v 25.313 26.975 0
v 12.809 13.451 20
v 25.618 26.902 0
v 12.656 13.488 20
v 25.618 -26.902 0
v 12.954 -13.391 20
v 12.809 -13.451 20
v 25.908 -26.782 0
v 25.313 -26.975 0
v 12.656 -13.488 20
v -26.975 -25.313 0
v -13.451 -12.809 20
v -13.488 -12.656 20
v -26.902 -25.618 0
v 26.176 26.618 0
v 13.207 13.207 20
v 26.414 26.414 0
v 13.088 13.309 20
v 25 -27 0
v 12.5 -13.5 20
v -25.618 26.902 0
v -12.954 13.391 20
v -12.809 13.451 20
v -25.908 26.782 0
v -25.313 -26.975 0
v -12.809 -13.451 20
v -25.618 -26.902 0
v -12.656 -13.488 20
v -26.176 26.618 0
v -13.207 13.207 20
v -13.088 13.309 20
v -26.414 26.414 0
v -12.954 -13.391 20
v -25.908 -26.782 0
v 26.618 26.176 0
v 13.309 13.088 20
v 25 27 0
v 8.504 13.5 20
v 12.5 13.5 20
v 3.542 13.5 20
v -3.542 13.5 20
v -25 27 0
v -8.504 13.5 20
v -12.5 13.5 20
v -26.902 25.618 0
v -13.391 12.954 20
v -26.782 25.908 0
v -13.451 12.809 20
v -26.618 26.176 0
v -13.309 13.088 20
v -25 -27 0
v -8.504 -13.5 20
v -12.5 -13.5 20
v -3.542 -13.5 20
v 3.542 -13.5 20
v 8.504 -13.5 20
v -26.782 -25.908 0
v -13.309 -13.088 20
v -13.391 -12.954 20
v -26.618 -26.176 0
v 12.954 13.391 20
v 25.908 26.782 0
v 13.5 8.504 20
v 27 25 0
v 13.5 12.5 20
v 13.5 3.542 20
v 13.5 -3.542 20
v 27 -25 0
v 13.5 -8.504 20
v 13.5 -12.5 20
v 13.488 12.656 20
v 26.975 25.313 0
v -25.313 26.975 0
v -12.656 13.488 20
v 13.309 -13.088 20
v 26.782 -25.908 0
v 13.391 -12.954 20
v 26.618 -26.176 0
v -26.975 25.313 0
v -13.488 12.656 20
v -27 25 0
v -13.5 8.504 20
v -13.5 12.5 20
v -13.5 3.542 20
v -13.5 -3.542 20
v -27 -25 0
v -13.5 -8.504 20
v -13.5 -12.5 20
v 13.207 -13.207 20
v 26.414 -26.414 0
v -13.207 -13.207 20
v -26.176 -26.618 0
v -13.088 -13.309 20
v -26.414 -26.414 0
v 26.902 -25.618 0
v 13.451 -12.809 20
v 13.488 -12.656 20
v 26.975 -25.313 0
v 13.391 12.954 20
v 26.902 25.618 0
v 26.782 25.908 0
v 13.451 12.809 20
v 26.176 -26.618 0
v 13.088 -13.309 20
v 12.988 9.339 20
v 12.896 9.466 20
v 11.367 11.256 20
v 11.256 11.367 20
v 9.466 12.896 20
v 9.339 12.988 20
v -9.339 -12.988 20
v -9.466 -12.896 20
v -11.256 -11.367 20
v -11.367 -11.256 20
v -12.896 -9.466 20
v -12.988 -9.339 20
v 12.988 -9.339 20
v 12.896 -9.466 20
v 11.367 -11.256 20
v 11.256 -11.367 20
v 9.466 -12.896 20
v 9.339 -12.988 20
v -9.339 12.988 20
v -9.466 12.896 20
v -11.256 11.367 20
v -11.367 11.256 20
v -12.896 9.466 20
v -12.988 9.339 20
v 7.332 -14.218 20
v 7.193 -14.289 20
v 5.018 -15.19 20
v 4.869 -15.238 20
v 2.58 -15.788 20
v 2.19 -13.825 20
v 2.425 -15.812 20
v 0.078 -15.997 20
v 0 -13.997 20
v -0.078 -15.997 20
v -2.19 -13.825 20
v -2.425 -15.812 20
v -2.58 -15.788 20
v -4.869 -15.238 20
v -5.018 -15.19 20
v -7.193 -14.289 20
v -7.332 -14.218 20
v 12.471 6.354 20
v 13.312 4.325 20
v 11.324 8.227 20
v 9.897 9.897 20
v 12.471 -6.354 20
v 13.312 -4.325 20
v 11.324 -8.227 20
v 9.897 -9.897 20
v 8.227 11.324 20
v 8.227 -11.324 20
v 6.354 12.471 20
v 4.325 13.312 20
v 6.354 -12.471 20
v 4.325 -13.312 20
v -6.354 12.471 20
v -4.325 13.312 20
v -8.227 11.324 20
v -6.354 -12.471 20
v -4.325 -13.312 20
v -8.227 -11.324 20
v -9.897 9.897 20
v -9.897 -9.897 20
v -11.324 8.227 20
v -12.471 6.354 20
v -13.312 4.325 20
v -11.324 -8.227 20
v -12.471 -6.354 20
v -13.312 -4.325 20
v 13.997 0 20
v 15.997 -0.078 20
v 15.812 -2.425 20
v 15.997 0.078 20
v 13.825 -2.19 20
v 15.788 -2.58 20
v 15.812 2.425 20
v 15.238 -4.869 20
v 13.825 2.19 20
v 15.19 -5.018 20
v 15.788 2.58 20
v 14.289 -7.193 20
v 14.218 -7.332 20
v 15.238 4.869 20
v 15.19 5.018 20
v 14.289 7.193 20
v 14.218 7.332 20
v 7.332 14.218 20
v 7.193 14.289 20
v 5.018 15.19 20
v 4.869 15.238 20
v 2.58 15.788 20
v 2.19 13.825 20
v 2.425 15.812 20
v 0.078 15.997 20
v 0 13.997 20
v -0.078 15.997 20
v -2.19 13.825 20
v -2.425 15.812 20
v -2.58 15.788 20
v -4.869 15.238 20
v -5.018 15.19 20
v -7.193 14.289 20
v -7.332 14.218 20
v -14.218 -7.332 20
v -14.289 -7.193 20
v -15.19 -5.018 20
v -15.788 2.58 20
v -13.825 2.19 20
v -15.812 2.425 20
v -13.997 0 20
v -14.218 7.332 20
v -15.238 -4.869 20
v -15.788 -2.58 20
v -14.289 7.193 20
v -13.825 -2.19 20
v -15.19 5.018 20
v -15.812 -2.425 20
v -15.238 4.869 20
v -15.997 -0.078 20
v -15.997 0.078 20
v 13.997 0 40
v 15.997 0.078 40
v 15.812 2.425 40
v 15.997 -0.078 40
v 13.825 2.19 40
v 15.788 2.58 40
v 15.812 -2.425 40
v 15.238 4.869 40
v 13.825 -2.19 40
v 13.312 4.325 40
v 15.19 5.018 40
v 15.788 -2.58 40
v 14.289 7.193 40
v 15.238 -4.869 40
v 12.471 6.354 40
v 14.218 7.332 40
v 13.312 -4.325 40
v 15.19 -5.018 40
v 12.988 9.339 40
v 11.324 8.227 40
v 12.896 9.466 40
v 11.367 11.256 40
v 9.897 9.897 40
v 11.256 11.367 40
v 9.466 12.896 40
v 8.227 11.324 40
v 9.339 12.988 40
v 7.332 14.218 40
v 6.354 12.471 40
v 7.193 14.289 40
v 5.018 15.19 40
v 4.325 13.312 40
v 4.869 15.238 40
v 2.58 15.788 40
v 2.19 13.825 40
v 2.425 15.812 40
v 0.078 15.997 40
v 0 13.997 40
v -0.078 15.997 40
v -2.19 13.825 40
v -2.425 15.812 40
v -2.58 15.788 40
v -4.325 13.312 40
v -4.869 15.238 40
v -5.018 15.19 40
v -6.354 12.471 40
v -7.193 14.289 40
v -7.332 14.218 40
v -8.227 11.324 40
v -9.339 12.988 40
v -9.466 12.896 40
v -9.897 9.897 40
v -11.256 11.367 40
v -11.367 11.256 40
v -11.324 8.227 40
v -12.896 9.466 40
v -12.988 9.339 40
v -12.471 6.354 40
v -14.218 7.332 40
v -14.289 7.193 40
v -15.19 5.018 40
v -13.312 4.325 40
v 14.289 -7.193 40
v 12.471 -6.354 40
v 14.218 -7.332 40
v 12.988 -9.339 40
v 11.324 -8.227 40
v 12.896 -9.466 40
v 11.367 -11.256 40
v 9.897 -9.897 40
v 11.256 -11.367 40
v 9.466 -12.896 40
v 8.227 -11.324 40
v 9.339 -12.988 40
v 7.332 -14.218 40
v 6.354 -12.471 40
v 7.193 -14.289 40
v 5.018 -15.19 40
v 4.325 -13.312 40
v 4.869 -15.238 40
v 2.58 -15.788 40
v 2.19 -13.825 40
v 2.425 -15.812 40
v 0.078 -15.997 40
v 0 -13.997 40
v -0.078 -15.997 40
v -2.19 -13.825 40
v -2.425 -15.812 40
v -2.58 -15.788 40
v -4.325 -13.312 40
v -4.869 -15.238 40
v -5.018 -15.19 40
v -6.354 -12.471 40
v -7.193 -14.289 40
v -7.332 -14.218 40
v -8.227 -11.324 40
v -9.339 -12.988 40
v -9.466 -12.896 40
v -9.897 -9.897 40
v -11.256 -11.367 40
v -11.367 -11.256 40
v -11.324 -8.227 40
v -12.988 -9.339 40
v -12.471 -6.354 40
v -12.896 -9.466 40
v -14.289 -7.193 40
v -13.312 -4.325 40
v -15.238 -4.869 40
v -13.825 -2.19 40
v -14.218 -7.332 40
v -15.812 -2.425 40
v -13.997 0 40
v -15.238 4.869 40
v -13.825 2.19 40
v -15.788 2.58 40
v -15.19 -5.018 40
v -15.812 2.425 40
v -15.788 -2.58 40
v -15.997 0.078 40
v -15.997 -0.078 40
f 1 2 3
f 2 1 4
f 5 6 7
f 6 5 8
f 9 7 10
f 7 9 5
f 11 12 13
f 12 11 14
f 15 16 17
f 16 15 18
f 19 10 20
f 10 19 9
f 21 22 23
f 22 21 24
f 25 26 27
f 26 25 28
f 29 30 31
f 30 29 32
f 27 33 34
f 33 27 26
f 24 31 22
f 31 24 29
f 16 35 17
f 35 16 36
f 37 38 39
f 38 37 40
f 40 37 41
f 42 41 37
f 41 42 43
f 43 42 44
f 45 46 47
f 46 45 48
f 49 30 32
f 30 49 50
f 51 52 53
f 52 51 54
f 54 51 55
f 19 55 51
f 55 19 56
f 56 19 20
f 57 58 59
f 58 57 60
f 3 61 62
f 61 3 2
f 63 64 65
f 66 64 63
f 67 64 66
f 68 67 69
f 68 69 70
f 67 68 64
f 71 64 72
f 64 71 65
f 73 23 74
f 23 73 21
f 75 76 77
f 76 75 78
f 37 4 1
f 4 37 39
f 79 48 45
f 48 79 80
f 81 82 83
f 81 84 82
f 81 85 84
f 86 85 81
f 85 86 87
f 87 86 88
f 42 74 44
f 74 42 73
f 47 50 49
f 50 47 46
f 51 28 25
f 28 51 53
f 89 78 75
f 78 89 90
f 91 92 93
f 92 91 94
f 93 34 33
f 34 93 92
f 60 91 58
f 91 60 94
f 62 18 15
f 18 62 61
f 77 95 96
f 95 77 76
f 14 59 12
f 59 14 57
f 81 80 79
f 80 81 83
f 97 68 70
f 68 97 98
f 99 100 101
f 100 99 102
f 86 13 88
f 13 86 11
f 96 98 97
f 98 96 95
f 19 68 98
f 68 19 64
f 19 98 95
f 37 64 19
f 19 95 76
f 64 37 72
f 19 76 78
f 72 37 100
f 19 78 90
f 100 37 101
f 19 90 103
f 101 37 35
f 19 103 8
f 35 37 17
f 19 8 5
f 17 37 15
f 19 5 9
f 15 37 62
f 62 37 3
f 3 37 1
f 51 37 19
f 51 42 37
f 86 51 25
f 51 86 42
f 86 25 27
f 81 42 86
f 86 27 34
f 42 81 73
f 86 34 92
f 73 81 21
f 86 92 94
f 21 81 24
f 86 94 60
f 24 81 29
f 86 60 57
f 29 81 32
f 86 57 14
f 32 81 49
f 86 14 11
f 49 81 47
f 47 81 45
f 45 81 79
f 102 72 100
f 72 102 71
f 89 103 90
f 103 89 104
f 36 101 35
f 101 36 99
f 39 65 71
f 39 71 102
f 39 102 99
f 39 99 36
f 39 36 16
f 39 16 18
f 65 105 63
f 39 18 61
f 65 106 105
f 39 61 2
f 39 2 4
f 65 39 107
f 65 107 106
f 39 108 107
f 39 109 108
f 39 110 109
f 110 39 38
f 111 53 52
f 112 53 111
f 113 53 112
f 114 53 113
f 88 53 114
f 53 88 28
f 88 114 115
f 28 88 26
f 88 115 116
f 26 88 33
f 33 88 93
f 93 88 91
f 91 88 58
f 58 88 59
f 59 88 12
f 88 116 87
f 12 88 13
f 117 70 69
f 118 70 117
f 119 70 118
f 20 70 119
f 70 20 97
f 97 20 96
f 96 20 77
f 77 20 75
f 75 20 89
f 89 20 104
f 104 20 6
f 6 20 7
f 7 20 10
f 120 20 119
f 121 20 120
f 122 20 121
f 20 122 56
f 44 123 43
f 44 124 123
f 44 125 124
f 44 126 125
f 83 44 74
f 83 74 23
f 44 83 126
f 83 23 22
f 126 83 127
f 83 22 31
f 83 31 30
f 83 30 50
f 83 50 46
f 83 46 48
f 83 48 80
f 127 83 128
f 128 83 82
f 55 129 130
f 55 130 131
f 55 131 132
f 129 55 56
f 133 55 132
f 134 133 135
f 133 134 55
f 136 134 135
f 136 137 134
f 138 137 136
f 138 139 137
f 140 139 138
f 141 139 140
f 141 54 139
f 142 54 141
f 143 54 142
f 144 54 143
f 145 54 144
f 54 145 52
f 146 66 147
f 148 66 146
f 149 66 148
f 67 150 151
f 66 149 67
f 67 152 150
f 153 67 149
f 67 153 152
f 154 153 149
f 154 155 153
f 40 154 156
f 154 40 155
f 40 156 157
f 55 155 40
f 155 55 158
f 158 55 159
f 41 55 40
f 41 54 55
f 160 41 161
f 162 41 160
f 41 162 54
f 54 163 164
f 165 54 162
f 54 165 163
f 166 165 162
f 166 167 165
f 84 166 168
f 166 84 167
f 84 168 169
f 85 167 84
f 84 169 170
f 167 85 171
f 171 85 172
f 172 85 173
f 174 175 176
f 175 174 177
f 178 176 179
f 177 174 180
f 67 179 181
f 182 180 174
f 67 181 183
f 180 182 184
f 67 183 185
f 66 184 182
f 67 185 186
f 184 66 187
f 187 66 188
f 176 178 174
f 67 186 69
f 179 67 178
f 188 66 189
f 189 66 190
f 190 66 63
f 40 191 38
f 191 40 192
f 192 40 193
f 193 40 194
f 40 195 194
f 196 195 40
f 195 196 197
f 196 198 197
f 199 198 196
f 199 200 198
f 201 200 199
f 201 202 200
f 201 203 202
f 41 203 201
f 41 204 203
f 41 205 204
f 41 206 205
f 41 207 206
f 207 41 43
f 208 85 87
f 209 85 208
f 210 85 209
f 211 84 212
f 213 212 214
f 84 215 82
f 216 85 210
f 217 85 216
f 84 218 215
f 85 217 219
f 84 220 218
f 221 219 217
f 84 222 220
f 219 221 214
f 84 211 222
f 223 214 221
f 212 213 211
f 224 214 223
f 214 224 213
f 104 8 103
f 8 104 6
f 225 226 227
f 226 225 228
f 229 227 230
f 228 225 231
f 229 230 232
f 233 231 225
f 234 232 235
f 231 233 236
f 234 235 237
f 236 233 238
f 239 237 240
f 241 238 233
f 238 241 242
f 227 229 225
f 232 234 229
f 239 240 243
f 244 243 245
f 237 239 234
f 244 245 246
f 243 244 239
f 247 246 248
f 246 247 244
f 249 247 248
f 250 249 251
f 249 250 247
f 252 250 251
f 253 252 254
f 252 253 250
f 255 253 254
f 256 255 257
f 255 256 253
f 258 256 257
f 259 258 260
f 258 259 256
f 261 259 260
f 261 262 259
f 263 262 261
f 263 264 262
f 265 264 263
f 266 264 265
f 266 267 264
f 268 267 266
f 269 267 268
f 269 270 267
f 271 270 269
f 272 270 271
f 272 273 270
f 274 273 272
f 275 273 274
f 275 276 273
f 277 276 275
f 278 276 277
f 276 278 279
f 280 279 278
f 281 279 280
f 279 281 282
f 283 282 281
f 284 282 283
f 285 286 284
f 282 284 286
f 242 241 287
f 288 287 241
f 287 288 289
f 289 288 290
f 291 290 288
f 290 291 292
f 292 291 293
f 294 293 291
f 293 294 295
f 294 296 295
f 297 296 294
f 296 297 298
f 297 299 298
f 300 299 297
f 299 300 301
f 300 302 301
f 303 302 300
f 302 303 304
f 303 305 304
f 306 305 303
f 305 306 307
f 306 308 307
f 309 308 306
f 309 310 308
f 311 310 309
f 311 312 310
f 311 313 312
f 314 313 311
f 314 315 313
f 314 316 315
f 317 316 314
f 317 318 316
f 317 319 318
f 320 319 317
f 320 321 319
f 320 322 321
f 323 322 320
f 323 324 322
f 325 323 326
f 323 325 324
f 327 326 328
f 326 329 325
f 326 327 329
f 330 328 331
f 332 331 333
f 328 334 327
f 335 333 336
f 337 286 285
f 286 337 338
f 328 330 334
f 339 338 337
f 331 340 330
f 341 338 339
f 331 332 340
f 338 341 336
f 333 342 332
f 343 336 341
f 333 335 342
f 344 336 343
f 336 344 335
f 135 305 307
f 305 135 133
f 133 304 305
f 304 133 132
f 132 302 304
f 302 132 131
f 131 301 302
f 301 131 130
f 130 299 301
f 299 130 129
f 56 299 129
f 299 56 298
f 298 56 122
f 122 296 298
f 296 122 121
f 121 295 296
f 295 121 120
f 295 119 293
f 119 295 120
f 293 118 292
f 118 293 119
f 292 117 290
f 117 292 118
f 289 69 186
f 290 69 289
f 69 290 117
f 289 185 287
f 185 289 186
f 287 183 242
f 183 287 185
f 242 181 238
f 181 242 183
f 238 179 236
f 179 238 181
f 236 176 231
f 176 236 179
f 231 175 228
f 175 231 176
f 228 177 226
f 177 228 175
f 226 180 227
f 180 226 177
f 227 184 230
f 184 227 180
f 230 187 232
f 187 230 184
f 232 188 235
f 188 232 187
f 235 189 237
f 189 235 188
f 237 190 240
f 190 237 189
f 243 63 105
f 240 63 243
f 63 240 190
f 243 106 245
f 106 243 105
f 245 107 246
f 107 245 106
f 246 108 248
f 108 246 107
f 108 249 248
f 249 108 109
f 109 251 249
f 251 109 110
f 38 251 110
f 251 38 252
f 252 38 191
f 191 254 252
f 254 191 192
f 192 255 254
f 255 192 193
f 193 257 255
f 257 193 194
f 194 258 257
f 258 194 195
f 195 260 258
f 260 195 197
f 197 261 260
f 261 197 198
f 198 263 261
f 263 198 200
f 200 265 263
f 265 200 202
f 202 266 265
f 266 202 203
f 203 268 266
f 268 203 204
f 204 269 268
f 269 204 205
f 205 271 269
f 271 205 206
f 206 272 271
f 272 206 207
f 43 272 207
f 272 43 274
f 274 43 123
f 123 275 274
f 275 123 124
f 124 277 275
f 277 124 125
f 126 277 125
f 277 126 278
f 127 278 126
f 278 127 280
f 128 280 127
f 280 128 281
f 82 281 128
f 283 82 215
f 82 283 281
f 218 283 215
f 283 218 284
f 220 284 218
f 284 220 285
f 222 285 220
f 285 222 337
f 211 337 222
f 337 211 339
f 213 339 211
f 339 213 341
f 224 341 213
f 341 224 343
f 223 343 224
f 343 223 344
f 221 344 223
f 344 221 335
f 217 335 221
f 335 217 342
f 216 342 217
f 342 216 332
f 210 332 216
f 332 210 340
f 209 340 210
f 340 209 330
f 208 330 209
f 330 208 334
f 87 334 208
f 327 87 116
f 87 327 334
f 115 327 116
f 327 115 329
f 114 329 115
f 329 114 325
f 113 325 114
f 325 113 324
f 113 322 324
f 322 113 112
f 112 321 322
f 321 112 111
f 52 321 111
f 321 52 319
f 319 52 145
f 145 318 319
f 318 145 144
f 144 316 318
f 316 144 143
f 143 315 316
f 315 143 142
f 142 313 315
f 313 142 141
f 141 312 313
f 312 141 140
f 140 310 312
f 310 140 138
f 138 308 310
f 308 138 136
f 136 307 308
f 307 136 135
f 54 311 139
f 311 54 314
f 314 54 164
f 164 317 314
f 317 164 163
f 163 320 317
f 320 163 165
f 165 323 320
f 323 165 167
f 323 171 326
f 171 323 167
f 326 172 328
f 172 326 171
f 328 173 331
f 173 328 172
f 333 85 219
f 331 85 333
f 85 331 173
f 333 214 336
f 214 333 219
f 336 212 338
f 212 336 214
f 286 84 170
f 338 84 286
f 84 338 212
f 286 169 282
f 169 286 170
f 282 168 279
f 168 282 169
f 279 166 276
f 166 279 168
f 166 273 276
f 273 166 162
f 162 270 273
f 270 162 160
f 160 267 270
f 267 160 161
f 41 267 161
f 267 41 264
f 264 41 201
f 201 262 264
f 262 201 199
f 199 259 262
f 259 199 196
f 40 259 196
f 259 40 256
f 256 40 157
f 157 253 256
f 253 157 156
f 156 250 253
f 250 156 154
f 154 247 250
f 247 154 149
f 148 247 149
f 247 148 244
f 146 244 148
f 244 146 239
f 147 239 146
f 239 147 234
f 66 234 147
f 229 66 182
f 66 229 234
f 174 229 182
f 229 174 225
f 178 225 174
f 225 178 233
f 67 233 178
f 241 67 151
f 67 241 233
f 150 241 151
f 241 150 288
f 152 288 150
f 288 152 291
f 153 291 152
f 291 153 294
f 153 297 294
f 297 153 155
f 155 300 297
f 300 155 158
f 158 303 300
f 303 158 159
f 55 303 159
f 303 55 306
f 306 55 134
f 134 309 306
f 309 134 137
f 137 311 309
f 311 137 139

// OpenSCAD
// offset.scad - Example for offset() usage in OpenSCAD

$fn = 40;

foot_height = 20;

echo(version=version());

module outline(wall = 1) {
  difference() {
    offset(wall / 2) children();
    offset(-wall / 2) children();
  }
}

// offsetting with a positive value allows to create rounded corners easily
linear_extrude(height = foot_height, scale = 0.5) {
  offset(2) {
    square(50, center = true);
  }
}

translate([0, 0, foot_height]) {
  linear_extrude(height = 20) {
    outline(wall = 2) circle(15);
  }
}

%cylinder(r = 14, h = 100);
%translate([0, 0, 100]) sphere(r = 30);



// Written in 2014 by Torsten Paul <Torsten.Paul@gmx.de>
//
// To the extent possible under law, the author(s) have dedicated all
// copyright and related and neighboring rights to this software to the
// public domain worldwide. This software is distributed without any
// warranty.
//
// You should have received a copy of the CC0 Public Domain
// Dedication along with this software.
// If not, see <http://creativecommons.org/publicdomain/zero/1.0/>.
